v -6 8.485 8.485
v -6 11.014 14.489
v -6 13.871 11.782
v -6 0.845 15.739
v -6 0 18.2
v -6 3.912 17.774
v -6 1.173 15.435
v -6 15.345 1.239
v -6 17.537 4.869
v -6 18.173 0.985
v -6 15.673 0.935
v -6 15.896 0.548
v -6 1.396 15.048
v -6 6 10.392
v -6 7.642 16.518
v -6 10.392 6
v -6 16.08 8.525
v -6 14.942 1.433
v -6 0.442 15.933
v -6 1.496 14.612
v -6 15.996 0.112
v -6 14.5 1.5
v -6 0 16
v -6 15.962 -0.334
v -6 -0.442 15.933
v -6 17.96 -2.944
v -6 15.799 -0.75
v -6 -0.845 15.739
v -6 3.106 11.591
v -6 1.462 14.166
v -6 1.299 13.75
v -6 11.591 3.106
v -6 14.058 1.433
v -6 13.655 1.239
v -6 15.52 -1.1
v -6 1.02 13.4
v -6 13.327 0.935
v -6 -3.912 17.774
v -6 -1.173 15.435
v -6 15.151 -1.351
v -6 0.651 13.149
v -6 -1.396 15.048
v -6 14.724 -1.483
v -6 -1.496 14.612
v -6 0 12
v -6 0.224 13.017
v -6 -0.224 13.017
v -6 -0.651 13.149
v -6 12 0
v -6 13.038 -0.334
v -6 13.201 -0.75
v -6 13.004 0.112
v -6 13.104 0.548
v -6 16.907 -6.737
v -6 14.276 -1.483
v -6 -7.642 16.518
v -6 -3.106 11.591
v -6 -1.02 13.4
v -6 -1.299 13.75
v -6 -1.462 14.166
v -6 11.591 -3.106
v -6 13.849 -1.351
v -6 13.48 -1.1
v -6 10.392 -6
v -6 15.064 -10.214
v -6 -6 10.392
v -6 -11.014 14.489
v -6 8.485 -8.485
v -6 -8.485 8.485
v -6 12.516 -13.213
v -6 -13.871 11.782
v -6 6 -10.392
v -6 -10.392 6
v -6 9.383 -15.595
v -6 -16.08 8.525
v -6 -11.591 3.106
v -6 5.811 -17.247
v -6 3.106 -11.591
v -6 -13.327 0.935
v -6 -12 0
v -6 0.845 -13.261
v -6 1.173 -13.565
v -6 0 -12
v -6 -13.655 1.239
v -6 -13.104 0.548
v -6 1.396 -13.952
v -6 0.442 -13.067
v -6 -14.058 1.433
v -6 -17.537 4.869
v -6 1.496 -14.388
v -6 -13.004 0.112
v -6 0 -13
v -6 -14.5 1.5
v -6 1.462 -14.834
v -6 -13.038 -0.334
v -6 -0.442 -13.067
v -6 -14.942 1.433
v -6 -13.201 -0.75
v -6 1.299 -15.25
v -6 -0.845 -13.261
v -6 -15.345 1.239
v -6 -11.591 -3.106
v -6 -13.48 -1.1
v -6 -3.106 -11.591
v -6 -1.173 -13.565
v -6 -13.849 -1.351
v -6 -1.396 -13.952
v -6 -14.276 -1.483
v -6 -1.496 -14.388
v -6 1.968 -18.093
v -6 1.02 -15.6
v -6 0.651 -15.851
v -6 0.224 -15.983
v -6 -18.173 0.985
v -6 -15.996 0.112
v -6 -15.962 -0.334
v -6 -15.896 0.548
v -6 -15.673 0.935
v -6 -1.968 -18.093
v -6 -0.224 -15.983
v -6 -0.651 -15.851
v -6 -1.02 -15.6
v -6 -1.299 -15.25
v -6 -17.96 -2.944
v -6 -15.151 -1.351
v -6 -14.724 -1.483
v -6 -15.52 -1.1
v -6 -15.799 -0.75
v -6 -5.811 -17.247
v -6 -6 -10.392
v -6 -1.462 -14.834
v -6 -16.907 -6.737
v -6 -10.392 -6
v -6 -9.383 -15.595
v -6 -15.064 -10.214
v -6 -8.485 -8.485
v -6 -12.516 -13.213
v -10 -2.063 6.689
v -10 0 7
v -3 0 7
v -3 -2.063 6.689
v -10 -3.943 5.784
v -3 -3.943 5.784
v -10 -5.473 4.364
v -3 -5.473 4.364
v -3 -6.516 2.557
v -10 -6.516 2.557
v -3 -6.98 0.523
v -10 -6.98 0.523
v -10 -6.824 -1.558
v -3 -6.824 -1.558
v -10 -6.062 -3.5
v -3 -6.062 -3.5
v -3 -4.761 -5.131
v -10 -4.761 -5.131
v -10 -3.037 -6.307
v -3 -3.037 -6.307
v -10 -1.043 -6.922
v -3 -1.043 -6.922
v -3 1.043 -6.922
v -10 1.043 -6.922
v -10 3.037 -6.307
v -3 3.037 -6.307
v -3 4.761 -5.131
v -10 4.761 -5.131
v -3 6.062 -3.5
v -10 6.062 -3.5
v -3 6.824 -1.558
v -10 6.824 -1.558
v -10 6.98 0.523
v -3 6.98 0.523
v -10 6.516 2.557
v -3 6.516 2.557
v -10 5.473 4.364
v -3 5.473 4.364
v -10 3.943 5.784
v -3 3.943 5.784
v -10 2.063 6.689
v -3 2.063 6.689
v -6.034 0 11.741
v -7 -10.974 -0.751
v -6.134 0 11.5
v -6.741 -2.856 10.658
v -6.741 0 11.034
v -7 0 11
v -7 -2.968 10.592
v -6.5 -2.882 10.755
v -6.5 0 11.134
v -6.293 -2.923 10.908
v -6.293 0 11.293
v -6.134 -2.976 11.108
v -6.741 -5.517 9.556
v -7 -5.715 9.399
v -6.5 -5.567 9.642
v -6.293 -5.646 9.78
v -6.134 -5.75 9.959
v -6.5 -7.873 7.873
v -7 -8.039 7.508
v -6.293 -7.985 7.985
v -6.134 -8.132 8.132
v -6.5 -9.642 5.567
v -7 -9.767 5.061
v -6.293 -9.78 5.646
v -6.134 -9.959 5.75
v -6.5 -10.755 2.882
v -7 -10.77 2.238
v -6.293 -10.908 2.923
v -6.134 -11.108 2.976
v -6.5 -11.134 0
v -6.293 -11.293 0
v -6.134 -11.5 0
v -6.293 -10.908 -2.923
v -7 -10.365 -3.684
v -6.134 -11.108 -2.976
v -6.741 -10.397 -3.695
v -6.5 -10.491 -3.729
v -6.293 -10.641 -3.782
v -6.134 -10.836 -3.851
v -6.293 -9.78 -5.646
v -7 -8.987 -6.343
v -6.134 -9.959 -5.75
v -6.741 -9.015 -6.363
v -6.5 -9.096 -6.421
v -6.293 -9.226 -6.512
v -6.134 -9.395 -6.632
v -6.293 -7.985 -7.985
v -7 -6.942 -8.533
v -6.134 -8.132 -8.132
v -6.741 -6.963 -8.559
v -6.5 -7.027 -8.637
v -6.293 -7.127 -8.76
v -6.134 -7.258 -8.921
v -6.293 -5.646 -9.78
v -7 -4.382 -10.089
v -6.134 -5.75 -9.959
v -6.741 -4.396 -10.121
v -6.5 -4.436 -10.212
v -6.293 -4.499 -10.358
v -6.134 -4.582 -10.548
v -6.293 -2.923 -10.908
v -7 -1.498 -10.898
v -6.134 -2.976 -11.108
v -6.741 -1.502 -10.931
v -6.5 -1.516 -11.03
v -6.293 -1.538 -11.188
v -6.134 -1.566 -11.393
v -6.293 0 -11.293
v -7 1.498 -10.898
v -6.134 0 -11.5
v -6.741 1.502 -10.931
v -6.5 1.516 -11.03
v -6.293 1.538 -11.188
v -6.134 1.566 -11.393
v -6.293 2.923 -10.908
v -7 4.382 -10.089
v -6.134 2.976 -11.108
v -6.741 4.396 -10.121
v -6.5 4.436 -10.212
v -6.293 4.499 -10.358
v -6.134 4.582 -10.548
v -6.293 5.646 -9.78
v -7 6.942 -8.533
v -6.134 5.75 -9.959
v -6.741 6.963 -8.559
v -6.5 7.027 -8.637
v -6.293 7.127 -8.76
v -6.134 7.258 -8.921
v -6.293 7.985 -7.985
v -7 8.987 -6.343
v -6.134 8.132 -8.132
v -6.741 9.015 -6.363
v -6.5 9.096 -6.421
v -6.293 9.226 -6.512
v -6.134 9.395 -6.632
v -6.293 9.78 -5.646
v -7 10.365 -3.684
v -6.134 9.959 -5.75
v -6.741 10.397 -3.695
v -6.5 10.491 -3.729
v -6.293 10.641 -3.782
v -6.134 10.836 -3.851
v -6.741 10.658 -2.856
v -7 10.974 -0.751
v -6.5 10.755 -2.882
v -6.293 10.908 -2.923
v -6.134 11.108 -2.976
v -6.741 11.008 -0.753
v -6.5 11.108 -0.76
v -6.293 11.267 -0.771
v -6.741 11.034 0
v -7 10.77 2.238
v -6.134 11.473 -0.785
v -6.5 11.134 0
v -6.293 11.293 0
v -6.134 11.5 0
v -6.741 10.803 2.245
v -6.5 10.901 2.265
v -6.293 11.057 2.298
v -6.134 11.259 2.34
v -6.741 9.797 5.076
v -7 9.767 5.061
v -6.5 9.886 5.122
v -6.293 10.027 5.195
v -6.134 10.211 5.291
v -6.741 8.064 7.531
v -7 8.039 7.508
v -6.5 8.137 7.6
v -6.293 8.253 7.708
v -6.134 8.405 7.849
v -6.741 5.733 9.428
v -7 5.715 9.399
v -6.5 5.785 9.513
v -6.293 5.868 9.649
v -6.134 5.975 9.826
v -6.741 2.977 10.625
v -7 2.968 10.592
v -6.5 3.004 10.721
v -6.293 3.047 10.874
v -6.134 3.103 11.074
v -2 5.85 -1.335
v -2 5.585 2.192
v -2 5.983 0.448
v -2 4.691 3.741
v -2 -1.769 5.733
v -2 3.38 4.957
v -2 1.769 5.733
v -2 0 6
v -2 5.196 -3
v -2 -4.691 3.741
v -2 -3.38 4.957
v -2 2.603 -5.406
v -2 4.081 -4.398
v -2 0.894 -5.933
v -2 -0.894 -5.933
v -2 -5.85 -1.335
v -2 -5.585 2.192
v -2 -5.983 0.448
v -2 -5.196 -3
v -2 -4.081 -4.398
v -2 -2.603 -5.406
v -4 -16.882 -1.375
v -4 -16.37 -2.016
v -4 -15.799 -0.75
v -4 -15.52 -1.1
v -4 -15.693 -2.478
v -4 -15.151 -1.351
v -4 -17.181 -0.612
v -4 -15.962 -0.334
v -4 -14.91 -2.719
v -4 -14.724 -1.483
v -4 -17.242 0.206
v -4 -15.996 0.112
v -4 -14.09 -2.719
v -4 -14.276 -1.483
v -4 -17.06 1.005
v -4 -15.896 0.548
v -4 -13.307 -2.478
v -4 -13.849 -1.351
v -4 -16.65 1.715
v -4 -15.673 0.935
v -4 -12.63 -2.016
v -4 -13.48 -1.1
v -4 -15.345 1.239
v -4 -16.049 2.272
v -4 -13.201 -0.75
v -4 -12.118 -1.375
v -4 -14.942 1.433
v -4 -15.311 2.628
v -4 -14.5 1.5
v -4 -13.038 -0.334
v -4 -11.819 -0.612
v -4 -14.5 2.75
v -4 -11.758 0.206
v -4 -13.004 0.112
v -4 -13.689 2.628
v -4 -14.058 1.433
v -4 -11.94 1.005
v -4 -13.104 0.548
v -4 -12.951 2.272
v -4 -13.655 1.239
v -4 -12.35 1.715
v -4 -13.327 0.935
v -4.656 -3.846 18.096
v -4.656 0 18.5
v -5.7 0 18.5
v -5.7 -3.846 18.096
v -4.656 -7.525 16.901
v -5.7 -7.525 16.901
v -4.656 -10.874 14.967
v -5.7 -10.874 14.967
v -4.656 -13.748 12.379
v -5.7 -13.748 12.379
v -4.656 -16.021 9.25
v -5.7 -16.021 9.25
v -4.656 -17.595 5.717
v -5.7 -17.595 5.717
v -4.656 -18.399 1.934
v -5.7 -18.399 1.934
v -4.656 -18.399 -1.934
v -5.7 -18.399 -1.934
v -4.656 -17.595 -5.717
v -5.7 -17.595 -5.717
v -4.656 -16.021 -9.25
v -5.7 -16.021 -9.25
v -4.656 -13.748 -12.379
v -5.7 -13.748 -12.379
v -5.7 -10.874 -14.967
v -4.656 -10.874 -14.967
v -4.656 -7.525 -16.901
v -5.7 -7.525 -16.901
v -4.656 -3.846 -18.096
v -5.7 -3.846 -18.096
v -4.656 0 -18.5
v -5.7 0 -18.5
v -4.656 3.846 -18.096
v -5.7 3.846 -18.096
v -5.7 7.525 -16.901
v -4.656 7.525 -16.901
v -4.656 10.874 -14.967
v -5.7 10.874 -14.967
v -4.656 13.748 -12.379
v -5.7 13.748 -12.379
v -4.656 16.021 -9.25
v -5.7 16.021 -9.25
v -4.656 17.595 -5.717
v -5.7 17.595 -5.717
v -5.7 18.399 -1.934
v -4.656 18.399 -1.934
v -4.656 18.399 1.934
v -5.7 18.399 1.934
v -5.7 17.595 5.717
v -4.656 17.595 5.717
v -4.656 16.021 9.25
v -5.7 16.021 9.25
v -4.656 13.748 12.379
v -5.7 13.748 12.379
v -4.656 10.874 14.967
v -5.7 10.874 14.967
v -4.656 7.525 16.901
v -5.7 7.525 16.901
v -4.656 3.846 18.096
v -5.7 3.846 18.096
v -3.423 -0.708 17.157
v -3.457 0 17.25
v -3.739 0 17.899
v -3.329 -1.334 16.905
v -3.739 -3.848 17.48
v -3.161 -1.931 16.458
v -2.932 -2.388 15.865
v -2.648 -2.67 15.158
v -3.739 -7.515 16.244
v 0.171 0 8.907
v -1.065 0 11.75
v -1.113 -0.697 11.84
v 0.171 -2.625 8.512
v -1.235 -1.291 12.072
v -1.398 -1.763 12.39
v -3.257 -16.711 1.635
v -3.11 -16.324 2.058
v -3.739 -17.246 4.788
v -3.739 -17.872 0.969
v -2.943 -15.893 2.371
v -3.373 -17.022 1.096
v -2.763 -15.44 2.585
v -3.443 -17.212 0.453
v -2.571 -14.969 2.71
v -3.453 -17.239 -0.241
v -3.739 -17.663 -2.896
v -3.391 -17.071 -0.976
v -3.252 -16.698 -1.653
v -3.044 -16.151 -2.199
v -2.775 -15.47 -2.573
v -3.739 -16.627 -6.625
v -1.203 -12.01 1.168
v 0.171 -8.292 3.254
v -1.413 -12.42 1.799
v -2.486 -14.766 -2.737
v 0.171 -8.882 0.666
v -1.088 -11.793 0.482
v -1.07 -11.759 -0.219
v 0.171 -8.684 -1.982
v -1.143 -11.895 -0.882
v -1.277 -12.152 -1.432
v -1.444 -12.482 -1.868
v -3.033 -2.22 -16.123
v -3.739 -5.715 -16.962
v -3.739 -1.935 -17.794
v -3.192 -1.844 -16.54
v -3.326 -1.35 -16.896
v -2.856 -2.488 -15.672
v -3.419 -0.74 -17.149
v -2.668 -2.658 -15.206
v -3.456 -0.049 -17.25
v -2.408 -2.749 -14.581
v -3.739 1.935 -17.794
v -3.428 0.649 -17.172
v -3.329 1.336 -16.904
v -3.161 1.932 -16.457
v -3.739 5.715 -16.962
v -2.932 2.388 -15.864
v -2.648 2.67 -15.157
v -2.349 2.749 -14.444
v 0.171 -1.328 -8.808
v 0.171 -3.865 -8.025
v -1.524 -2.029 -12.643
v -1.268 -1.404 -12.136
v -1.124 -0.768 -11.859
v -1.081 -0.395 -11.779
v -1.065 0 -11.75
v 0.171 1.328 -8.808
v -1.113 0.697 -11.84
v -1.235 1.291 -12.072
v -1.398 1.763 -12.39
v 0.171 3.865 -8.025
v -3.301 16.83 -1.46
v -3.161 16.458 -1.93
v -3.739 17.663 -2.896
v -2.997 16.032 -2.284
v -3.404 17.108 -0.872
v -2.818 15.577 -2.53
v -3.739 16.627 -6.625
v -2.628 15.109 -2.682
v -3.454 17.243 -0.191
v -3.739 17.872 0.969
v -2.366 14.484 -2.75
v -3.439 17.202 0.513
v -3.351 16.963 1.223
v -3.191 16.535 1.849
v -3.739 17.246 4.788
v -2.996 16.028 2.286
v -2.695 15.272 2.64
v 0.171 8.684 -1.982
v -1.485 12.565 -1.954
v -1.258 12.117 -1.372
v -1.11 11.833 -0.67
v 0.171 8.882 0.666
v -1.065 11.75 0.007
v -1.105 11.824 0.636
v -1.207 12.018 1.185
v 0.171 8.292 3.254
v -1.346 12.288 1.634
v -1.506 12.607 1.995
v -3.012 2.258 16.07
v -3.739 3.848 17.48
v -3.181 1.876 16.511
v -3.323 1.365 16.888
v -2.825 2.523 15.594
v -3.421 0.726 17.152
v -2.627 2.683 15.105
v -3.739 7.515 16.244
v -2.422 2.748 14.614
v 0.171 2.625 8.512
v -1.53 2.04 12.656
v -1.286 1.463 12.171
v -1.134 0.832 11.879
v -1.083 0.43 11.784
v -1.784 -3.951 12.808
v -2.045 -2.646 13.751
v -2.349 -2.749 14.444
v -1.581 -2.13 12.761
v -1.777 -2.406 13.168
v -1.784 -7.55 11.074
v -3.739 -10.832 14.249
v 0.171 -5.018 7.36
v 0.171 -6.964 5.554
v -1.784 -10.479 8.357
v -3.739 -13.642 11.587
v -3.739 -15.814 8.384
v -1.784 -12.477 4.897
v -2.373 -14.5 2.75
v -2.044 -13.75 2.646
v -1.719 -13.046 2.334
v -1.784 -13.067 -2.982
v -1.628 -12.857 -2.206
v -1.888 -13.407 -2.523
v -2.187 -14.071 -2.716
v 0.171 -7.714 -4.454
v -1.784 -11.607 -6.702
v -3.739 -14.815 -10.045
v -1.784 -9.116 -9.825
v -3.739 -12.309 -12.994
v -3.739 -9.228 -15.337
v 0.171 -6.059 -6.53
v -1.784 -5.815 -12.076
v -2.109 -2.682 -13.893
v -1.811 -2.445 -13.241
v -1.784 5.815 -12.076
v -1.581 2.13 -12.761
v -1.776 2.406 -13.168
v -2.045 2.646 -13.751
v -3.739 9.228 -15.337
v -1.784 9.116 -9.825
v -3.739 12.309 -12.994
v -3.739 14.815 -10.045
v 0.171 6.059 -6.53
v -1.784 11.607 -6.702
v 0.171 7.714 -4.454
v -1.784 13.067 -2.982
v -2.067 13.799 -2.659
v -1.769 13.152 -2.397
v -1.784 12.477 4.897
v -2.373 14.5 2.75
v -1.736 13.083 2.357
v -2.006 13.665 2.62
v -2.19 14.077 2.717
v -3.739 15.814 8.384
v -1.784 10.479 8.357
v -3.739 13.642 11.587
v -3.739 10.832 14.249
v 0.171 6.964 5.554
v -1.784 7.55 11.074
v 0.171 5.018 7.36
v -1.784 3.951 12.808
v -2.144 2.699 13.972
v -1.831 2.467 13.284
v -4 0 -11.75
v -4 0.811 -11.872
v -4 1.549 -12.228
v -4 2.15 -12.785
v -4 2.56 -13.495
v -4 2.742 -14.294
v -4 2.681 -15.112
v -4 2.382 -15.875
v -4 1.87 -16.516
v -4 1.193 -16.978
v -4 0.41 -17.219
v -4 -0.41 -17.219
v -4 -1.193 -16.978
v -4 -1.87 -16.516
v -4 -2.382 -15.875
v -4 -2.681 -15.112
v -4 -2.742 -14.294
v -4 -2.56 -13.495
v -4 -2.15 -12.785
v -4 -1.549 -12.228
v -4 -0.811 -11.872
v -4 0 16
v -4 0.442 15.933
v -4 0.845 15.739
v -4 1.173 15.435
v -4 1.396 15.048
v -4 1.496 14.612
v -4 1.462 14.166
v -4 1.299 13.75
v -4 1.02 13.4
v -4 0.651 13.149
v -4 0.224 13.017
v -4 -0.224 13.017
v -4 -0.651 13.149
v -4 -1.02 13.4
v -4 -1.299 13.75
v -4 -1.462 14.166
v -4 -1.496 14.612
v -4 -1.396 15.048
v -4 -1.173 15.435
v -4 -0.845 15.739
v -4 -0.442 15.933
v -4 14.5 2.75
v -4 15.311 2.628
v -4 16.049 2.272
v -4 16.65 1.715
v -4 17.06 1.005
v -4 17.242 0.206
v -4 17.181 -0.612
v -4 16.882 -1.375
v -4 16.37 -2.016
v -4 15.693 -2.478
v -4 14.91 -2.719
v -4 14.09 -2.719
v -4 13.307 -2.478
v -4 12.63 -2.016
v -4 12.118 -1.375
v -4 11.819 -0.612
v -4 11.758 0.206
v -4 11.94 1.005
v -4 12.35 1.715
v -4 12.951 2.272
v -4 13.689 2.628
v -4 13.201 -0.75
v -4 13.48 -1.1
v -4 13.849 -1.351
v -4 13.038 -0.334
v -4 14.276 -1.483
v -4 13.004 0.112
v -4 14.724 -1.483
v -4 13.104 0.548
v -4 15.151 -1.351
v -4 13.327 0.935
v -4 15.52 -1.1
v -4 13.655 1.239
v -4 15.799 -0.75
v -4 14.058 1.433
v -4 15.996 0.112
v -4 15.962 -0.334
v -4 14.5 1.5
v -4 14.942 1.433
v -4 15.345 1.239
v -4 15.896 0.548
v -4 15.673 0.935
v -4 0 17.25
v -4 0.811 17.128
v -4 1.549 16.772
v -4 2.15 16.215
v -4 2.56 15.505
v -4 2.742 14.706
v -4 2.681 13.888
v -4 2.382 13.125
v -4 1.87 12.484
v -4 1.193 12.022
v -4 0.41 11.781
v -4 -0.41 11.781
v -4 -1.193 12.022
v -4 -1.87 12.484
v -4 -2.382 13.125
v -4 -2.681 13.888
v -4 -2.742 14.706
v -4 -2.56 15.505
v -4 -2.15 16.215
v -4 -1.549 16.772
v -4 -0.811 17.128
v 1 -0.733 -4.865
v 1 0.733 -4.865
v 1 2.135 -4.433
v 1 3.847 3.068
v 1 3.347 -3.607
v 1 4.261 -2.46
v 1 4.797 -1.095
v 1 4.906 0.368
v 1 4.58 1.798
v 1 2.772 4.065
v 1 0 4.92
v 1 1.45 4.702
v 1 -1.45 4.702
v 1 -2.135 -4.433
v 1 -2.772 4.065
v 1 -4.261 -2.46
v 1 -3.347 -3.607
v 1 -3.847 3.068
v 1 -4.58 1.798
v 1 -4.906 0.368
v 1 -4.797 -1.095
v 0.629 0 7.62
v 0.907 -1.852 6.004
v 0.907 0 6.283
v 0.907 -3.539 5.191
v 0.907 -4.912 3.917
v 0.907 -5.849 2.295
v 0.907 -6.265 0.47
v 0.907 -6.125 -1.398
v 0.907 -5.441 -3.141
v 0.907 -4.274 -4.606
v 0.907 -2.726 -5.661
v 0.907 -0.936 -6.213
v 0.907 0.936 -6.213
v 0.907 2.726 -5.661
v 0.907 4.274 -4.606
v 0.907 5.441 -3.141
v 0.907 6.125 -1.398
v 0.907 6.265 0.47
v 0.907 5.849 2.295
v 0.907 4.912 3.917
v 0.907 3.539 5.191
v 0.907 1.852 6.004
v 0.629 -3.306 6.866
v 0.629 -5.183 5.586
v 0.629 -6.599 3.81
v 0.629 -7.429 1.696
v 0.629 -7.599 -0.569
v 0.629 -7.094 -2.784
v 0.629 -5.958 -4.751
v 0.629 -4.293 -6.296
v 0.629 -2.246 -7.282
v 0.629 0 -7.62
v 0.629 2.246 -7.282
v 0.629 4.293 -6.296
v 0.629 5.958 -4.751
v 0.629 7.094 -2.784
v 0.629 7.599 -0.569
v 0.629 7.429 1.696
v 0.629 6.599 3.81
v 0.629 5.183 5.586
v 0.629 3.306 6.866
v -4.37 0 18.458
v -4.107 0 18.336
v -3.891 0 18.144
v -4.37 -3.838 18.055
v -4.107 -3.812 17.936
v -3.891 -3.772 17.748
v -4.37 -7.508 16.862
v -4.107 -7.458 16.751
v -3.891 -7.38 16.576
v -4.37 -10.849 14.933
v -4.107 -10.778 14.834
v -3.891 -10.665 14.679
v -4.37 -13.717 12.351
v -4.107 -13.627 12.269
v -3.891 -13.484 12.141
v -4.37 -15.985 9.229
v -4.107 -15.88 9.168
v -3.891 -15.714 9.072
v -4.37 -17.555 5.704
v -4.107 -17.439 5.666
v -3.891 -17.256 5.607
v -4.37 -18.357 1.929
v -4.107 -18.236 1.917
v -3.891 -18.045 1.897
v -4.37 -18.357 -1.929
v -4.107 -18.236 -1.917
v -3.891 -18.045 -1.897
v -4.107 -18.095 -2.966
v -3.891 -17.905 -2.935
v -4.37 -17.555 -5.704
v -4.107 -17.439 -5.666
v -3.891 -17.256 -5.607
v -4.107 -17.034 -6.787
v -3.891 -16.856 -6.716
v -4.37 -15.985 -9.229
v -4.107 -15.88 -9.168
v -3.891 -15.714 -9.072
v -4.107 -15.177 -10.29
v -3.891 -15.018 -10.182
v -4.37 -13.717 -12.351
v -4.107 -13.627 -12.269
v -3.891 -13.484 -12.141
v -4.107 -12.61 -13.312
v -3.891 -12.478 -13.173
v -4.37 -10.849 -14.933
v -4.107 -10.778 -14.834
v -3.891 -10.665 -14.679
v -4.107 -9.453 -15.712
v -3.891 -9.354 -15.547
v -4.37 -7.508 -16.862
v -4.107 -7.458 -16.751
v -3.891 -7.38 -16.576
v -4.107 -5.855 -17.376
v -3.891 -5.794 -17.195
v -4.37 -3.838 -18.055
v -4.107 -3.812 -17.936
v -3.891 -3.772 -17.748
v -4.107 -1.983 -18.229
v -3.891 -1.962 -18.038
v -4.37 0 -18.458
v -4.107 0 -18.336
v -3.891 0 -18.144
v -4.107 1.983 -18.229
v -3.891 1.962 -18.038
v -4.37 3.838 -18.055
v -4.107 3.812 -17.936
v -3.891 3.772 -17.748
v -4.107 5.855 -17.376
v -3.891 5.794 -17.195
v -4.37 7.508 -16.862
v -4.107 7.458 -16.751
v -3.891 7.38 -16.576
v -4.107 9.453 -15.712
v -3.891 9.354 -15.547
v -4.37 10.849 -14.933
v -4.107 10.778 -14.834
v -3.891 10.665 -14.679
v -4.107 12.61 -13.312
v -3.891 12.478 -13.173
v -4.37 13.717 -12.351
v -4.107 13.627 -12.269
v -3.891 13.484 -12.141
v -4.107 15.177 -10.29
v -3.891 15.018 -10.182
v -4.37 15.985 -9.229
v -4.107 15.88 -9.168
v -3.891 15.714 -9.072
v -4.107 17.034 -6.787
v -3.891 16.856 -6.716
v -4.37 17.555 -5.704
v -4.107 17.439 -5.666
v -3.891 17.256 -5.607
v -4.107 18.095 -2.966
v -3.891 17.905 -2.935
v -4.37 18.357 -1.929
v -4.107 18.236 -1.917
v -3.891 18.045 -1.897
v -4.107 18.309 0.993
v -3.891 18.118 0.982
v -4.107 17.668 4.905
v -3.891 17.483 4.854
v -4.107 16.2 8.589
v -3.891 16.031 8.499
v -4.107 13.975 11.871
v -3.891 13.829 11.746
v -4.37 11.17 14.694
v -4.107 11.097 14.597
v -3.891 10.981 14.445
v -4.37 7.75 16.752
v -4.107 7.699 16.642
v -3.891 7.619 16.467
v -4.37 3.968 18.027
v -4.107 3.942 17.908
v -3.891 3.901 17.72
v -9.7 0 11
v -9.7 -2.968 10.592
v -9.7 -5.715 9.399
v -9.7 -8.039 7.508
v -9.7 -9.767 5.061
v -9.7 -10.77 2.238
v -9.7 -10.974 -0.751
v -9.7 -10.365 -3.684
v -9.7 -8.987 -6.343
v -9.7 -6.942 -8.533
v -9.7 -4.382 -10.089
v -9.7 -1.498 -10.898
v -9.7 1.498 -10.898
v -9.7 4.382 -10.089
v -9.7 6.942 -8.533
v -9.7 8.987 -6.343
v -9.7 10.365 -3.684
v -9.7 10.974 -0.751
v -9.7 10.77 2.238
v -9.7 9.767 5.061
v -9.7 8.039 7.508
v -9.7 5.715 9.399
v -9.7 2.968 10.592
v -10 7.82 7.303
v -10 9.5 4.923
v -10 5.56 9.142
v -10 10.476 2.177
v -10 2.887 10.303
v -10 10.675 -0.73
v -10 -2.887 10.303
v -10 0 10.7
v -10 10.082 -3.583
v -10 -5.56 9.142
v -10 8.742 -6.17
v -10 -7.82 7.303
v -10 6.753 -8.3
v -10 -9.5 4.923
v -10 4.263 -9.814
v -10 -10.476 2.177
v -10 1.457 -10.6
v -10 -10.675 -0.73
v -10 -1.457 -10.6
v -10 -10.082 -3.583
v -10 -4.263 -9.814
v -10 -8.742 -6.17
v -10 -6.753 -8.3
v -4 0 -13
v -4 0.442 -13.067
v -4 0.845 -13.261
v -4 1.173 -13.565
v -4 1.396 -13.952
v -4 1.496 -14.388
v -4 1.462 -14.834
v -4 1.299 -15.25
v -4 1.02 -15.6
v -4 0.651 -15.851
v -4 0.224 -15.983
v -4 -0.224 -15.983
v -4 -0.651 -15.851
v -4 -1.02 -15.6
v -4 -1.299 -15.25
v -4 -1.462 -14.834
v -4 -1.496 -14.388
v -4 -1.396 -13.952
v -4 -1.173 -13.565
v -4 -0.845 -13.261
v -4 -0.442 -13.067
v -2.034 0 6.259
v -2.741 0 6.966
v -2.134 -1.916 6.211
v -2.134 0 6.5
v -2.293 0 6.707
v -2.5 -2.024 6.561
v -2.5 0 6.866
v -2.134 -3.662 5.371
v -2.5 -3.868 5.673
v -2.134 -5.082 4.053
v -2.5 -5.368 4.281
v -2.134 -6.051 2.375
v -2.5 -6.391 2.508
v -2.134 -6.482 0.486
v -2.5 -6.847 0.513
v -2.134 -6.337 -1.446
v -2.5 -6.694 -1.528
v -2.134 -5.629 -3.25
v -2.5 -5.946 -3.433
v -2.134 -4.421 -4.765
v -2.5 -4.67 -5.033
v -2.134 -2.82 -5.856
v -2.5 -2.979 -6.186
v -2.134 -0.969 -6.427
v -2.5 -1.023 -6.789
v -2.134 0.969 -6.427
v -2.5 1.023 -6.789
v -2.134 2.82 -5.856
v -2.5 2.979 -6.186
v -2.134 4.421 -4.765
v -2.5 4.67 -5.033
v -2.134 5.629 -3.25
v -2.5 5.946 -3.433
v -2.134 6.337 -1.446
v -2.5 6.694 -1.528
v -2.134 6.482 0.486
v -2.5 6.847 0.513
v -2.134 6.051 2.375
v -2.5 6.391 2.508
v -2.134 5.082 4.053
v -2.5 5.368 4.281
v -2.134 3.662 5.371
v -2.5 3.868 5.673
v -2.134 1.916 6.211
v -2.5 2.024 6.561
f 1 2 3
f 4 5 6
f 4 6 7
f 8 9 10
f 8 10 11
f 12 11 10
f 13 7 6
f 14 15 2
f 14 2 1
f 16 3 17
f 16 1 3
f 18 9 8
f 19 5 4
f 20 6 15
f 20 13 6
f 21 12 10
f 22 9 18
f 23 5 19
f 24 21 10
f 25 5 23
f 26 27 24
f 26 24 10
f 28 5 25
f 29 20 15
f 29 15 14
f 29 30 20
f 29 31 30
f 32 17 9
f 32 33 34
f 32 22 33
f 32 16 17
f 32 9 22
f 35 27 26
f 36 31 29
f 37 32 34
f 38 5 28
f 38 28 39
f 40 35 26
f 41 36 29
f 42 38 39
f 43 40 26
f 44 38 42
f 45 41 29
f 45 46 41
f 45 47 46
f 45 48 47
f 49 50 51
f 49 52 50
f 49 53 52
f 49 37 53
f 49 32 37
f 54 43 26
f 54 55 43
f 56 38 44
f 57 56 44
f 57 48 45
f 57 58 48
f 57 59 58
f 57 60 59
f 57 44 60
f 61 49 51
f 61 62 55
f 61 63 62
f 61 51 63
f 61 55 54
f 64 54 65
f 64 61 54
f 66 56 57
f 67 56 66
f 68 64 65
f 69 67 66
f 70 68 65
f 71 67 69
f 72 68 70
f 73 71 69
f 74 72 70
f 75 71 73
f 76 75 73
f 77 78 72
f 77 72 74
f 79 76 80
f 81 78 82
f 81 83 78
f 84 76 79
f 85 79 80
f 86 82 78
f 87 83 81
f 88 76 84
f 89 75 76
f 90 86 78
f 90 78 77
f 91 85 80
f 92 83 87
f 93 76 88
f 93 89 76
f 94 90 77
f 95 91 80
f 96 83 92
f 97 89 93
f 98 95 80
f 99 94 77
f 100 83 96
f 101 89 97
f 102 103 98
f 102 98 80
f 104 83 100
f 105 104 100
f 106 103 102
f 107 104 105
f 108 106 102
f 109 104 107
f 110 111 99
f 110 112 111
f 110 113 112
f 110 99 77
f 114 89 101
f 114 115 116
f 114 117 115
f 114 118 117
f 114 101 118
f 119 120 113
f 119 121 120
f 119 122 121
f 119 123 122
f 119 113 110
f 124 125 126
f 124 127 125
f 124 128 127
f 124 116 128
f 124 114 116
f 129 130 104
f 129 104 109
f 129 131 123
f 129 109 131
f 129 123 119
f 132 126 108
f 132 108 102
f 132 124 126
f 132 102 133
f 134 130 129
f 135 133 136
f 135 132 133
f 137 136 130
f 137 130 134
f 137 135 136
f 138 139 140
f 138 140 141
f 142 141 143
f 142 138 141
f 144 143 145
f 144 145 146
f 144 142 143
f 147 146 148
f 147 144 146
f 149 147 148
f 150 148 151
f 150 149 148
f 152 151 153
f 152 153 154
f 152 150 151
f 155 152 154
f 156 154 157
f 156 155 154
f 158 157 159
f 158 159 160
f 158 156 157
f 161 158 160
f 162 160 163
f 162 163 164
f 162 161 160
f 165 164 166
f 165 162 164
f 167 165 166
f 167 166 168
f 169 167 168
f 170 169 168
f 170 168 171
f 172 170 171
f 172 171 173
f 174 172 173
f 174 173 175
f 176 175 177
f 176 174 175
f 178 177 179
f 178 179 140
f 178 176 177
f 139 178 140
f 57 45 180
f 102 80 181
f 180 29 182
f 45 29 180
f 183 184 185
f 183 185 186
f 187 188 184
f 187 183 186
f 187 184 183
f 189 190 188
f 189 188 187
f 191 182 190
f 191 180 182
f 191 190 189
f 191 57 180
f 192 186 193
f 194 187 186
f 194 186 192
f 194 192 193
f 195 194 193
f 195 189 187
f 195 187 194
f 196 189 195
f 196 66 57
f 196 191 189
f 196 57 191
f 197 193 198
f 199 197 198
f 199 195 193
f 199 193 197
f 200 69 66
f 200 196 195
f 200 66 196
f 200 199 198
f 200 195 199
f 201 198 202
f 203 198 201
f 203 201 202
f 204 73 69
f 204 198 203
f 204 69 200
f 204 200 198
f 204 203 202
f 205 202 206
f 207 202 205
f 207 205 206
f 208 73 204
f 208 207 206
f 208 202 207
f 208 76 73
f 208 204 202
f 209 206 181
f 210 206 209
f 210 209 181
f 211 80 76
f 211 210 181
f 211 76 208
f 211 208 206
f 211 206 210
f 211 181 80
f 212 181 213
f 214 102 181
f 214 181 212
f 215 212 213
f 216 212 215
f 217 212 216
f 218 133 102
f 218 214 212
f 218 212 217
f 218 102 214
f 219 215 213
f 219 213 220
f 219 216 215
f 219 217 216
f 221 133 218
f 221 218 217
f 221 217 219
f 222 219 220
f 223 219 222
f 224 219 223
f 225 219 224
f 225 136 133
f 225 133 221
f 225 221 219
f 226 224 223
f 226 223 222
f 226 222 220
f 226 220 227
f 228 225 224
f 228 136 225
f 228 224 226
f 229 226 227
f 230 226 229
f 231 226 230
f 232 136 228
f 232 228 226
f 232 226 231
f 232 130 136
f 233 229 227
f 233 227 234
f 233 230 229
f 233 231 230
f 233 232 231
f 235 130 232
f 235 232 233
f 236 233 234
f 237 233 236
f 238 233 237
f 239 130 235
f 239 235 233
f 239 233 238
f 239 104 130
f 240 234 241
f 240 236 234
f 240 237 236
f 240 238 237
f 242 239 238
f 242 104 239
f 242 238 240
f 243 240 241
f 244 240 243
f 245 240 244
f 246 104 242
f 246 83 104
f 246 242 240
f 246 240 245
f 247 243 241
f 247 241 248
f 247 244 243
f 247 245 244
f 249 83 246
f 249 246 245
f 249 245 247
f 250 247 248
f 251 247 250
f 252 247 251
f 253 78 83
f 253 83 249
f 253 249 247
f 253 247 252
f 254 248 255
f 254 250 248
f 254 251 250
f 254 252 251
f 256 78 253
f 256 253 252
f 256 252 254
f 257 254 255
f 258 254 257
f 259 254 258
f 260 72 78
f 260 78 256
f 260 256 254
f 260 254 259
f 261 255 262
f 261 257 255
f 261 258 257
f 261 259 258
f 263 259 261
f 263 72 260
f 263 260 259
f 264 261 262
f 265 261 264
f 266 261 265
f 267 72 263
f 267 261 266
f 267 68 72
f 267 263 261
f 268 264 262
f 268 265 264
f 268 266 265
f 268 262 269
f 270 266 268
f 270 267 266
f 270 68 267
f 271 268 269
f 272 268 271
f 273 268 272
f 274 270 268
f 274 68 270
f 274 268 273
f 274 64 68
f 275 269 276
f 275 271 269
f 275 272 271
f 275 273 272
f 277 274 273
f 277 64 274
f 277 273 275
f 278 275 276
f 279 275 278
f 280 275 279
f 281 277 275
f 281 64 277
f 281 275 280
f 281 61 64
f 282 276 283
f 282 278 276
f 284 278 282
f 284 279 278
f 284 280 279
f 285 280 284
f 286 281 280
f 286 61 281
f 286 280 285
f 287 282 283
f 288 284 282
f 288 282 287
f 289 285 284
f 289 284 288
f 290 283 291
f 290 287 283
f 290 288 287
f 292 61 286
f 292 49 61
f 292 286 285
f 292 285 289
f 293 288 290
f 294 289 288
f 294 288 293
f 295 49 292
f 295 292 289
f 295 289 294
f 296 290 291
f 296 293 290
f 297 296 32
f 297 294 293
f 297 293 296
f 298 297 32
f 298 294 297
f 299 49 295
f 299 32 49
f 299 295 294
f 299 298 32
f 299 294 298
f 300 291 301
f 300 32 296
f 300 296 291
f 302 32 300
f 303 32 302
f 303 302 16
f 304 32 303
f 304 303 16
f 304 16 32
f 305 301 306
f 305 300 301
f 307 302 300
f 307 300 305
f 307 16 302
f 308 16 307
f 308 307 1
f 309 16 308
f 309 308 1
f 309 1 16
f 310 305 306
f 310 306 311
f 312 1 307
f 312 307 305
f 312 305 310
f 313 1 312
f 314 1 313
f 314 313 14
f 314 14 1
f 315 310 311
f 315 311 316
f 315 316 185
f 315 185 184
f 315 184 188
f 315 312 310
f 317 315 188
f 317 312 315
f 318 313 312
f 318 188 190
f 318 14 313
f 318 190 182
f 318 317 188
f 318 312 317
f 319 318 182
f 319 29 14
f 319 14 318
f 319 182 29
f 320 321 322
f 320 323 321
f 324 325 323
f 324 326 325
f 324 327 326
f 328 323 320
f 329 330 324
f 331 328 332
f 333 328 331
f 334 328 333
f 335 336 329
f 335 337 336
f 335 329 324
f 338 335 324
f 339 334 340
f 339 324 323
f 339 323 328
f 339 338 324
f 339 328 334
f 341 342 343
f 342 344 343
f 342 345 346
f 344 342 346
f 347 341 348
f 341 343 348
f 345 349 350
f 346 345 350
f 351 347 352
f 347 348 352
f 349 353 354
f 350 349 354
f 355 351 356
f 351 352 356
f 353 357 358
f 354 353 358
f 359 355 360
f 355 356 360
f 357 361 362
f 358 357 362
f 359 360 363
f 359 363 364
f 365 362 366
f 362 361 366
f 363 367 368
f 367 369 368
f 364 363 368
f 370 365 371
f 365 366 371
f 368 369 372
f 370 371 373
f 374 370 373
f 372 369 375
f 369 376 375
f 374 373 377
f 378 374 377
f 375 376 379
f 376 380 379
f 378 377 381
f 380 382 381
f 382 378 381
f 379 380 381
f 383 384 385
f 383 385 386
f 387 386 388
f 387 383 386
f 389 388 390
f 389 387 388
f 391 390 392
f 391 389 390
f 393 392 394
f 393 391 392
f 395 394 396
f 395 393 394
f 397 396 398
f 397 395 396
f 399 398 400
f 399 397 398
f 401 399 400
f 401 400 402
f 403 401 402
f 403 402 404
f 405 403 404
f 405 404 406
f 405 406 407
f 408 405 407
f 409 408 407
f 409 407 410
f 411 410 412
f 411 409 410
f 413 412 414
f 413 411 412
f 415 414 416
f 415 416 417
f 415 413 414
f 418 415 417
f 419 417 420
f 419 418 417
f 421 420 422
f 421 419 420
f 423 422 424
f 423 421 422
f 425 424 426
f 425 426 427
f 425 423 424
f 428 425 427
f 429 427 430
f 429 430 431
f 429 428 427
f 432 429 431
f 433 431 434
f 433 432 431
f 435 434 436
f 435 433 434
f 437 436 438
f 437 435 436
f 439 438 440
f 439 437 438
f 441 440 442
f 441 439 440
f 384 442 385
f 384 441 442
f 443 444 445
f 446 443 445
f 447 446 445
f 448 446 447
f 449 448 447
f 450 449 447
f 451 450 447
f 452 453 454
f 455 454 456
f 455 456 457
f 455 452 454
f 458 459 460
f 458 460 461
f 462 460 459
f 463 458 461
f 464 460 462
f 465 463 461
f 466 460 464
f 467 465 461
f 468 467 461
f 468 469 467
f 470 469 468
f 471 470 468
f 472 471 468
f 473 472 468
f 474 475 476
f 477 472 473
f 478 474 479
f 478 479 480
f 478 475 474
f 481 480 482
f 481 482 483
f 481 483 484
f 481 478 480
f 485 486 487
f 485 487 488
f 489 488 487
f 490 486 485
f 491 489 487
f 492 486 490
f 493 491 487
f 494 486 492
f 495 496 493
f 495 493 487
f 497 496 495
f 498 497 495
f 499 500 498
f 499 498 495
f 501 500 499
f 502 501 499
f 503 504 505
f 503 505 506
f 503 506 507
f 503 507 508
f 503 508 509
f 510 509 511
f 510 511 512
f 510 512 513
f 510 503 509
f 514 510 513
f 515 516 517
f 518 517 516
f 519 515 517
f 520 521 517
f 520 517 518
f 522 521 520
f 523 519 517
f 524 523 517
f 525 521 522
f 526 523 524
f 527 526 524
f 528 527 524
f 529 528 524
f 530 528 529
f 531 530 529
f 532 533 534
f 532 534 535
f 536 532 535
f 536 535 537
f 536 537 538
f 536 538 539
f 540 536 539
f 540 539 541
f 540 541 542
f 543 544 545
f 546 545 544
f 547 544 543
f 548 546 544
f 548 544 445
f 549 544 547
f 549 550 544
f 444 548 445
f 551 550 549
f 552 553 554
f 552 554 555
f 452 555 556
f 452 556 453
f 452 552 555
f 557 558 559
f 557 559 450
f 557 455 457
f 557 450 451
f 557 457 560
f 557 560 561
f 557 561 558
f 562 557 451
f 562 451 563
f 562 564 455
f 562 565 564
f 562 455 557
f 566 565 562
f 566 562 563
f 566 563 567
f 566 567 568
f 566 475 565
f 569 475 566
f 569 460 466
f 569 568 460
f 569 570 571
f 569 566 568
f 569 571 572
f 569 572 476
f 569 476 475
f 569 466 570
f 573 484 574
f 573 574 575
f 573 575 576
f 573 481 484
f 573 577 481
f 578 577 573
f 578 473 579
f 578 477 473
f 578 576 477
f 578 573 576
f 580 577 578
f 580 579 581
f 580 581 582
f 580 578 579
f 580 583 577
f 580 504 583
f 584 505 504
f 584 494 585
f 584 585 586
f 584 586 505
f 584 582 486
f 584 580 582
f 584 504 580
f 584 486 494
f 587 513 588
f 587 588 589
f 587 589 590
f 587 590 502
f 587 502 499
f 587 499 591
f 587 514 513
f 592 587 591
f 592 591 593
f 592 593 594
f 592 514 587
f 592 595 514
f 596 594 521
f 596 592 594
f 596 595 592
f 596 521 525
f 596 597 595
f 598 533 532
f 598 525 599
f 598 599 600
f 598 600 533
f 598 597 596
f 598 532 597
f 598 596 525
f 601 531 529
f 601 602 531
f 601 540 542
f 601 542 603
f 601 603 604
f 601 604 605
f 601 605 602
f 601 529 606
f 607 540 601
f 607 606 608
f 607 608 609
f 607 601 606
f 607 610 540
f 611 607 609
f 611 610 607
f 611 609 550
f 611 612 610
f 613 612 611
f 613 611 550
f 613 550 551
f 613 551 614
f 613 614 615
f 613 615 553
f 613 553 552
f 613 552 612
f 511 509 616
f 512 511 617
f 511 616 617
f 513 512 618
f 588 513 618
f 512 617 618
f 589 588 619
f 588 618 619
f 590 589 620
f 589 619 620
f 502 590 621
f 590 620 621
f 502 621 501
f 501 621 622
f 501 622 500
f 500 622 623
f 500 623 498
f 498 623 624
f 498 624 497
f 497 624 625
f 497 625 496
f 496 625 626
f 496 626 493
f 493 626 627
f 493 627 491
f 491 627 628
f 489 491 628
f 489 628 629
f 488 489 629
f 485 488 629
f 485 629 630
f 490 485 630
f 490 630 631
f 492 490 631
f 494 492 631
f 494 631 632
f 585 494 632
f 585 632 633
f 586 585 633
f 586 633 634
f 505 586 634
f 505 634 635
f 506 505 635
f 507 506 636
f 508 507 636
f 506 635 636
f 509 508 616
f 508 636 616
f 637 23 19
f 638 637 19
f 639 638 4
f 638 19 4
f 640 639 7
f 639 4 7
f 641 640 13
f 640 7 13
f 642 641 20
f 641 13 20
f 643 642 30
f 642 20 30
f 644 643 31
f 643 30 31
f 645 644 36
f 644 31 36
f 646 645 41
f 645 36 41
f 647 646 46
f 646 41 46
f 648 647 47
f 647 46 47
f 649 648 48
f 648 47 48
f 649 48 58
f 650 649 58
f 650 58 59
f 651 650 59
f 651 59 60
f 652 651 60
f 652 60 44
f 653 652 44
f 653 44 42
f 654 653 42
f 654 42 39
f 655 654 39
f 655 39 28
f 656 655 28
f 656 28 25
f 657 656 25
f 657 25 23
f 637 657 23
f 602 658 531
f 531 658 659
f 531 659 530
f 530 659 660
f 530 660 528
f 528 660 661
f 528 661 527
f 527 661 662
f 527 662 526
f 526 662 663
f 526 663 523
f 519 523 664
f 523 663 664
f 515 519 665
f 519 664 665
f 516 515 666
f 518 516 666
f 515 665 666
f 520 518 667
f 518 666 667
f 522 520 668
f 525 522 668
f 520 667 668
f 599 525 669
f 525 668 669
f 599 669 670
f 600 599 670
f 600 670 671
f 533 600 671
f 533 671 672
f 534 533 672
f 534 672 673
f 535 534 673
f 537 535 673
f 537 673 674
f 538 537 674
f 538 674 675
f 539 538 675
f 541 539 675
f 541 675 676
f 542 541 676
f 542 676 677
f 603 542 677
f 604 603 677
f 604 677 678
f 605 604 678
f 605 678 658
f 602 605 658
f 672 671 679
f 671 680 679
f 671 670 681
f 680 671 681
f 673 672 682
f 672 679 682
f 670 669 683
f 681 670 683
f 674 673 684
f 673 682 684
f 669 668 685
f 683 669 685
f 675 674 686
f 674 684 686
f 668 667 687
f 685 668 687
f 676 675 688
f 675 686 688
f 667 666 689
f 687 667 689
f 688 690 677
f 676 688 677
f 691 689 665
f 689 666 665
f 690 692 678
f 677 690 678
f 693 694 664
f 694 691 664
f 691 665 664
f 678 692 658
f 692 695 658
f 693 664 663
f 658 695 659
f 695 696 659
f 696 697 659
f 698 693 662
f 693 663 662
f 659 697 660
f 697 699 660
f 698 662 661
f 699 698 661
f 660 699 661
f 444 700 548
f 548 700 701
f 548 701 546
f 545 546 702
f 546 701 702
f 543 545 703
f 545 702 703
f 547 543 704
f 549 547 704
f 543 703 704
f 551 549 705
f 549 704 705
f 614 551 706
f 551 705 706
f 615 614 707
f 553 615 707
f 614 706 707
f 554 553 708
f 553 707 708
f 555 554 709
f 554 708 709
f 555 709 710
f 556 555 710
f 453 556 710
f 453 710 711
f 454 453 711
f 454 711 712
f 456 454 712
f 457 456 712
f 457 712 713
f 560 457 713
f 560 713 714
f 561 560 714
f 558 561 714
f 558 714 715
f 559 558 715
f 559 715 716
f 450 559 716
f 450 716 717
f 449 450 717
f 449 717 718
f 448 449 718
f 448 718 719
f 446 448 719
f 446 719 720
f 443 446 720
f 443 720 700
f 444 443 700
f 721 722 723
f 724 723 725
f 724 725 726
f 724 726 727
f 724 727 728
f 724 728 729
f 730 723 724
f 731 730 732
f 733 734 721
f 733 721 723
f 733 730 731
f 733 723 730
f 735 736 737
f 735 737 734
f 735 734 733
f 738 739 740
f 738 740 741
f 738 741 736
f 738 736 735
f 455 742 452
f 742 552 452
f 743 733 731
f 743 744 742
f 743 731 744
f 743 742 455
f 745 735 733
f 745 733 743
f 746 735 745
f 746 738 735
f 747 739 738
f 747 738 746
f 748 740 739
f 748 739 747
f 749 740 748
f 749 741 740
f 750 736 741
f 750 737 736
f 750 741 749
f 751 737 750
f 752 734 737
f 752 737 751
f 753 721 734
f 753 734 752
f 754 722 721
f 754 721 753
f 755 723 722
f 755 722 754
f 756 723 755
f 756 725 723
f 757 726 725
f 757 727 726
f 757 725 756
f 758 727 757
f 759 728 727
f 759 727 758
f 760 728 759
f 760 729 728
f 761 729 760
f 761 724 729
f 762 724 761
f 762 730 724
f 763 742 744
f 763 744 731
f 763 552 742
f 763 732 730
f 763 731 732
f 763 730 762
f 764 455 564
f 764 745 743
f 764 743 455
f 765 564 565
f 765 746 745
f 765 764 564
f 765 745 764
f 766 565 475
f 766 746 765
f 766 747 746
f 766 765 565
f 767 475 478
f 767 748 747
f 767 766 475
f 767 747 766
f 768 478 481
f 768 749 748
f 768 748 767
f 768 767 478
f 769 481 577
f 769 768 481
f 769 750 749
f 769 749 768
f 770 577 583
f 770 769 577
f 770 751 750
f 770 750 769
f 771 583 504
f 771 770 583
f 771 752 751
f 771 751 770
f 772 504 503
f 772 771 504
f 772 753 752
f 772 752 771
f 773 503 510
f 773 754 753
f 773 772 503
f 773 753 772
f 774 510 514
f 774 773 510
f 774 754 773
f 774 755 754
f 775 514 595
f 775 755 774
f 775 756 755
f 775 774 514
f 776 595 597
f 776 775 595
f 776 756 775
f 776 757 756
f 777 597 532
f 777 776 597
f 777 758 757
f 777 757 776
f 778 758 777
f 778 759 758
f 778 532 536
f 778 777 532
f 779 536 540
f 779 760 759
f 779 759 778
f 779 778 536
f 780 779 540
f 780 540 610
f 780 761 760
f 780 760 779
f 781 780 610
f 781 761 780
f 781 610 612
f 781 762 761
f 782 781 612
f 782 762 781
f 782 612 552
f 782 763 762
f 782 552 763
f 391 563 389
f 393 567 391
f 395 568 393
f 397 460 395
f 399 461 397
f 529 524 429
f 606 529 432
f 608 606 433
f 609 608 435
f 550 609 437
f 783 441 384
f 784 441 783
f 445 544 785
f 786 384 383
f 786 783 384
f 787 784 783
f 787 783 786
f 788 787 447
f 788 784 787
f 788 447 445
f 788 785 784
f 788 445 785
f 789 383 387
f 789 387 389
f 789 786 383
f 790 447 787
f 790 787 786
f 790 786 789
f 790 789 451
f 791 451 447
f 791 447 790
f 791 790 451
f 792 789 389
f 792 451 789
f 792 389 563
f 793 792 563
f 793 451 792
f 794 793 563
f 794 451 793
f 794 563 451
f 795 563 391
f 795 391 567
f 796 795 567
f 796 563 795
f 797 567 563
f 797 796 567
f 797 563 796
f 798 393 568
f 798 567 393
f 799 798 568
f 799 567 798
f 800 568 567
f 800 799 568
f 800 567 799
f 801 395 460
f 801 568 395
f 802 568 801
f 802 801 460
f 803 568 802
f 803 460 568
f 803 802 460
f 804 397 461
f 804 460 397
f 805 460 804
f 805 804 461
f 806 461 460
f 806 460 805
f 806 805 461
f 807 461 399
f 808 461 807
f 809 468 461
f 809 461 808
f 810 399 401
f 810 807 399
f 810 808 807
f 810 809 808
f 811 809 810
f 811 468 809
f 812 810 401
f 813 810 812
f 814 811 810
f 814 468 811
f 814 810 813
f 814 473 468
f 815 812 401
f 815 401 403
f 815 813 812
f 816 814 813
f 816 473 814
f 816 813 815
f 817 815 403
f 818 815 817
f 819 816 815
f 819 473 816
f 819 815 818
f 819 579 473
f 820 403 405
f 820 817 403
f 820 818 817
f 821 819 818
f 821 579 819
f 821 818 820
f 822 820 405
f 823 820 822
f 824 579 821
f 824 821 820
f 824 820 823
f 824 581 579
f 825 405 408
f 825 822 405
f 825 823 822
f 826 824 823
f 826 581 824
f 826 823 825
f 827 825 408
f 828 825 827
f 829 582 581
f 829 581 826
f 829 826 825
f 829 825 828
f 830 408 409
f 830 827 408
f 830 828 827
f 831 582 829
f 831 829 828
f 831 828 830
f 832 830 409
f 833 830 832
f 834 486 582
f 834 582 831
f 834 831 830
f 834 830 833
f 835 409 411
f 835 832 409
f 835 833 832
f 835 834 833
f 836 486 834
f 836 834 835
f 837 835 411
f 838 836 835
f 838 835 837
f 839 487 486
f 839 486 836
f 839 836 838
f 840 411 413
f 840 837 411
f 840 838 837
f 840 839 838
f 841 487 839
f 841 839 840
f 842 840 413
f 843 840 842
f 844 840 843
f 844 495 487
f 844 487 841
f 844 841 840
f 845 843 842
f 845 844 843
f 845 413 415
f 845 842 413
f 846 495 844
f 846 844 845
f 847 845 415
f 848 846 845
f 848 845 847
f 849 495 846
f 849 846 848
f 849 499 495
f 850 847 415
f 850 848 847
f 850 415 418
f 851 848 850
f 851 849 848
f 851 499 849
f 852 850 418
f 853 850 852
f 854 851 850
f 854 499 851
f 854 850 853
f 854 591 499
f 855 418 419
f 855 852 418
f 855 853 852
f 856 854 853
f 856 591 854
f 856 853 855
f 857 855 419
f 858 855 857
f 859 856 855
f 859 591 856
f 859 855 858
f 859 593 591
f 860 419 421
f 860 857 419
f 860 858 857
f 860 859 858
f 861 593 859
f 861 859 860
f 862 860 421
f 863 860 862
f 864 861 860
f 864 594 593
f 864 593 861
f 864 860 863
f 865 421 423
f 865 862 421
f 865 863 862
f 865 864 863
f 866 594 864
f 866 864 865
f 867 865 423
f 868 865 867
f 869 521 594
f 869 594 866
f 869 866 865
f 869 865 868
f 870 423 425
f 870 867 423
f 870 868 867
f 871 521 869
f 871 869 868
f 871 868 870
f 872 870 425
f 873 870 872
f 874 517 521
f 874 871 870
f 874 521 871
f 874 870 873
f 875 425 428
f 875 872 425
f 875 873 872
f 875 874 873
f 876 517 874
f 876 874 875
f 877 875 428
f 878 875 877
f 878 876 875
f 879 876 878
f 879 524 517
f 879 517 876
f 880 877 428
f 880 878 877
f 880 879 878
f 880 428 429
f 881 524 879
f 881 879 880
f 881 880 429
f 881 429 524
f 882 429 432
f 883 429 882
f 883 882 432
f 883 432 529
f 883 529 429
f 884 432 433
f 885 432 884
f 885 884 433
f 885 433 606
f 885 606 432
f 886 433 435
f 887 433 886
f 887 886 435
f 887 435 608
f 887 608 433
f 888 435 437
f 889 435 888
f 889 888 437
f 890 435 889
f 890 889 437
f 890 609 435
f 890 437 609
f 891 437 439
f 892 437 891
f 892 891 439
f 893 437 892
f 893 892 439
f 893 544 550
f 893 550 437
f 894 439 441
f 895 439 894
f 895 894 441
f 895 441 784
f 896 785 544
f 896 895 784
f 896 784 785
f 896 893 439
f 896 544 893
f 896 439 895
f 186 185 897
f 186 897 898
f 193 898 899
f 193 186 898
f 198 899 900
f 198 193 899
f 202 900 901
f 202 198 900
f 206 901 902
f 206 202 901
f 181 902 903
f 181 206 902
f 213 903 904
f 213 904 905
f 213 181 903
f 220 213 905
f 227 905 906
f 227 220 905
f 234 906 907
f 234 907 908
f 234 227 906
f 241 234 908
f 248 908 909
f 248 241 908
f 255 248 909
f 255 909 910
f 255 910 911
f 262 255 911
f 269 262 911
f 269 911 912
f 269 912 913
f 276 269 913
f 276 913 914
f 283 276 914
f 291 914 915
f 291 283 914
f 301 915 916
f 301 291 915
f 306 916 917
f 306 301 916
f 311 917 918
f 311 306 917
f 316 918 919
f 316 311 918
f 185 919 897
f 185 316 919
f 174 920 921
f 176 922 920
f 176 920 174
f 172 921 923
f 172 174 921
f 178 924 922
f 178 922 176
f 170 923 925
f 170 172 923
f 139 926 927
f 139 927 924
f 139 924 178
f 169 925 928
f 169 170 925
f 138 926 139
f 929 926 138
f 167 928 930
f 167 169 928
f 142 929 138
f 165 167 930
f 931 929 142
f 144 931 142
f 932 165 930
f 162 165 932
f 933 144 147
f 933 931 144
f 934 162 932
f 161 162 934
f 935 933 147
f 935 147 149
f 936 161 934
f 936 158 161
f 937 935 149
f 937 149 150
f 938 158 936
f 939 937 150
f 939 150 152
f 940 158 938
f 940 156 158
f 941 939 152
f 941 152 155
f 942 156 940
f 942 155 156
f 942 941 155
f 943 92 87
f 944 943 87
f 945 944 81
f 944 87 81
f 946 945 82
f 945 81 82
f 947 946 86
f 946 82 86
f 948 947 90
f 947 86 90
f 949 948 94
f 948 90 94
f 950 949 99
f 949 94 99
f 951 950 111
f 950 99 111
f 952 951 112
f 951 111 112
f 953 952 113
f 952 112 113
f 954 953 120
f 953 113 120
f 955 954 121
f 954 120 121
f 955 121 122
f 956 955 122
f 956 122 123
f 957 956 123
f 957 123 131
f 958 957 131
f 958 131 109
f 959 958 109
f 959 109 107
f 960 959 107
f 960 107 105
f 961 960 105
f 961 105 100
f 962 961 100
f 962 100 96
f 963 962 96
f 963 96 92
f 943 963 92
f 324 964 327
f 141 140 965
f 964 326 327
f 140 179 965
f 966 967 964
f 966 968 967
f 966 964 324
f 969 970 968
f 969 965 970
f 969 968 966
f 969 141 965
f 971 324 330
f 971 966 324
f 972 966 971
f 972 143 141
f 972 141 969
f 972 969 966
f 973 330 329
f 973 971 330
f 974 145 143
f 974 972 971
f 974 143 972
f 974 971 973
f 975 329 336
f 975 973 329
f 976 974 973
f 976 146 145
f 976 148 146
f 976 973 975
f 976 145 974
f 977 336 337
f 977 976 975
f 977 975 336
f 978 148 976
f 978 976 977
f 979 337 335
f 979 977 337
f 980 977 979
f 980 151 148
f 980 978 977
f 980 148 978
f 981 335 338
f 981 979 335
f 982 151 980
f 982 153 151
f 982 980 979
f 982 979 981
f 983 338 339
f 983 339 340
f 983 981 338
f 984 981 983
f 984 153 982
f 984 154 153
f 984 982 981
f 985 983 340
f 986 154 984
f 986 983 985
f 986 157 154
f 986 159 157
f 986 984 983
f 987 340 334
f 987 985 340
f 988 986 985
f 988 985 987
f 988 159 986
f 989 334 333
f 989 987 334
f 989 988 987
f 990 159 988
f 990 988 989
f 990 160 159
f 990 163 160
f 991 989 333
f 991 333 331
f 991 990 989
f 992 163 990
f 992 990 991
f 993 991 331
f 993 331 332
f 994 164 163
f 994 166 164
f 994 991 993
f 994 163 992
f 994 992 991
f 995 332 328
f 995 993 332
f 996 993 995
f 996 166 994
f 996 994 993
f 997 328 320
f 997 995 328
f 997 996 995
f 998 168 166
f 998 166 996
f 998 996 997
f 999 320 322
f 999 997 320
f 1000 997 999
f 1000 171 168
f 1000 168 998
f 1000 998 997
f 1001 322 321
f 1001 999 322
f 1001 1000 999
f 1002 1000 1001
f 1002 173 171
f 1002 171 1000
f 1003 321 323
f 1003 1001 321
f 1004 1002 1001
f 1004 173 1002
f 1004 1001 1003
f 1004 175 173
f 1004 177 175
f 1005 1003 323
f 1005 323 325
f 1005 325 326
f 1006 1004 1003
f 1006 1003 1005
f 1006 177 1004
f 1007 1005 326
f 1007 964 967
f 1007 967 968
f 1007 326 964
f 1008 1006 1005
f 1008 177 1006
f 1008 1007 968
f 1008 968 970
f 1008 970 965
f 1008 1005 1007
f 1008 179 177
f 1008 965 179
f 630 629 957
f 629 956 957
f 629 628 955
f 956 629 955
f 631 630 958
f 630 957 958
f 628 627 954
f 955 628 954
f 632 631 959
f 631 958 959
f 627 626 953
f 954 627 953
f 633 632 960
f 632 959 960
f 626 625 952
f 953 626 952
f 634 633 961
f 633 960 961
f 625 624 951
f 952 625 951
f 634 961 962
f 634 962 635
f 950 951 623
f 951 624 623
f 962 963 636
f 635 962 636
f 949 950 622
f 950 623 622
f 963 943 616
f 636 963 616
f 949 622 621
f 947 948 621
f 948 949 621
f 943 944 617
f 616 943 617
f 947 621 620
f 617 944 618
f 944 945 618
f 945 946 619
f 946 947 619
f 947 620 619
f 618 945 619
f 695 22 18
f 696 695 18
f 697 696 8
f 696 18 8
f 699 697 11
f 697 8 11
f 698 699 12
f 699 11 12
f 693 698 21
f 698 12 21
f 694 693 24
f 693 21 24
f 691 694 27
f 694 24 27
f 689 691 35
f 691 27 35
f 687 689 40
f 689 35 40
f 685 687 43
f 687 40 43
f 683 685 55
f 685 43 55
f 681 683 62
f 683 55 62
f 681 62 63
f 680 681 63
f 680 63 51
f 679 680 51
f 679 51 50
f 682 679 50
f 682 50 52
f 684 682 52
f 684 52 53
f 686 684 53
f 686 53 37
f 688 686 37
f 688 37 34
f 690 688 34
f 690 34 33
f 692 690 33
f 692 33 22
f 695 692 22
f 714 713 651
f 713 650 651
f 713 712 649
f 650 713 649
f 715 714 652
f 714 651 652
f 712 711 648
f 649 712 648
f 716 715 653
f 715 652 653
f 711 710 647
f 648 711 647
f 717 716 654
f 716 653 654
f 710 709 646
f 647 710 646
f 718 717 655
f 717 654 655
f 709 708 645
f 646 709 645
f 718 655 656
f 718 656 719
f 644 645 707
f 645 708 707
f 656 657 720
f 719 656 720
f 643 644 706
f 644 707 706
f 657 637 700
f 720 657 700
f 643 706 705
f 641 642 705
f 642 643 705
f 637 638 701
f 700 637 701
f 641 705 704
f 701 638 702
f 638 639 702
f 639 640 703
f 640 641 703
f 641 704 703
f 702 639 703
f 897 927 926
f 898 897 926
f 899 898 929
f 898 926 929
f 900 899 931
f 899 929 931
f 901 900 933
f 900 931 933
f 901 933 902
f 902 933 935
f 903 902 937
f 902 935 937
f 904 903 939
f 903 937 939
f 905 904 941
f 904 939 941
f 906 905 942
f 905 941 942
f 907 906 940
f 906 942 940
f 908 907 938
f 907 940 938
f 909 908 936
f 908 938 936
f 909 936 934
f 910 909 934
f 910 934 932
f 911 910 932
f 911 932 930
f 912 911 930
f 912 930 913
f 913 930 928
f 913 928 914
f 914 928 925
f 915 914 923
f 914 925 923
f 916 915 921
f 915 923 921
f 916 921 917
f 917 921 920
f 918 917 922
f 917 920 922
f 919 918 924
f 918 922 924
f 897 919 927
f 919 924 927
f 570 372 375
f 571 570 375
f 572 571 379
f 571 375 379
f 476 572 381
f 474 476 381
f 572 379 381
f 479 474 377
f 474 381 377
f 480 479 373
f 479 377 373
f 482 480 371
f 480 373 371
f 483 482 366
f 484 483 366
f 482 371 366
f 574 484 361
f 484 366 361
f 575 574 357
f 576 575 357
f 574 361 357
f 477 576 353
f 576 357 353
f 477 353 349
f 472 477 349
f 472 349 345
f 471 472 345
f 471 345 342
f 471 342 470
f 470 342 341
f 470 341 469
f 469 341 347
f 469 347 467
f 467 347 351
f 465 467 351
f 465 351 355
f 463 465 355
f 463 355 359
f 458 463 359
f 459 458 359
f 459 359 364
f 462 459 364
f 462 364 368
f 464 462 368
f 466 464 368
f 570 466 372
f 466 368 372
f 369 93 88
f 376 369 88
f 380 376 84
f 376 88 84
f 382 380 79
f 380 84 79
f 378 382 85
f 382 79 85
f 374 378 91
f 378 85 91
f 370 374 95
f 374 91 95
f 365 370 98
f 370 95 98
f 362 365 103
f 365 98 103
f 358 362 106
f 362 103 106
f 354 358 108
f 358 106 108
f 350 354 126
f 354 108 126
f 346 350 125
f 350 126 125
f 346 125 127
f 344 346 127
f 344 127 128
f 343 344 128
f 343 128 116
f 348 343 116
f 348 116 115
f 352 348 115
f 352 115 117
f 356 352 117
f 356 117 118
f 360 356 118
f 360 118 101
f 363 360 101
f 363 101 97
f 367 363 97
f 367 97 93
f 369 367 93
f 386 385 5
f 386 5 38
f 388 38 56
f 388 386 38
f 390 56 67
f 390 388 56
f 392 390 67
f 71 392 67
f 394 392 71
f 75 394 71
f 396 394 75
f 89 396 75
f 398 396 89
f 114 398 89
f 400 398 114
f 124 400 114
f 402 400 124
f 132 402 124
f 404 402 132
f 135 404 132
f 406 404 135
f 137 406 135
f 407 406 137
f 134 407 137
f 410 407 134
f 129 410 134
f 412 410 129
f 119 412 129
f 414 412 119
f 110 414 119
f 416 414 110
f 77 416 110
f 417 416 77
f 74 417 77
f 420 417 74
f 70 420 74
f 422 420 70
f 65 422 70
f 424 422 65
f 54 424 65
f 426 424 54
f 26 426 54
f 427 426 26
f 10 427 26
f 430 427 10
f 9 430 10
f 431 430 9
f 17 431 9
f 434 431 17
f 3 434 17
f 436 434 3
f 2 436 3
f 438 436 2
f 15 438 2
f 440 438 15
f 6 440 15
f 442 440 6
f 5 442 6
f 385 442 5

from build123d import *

# Parameters (mm, degrees)
FILLET2_R          = 1
CHAMFER1_SIZE      = 0.3
SKETCH2_R          = 1.5
CUT_EXTRUDE1_DEPTH = 10
SKETCH3_R          = 2.75
CUT_EXTRUDE2_DEPTH = 10


with BuildPart() as part:
    # Sketch1 → Revolve1 (revolve)
    with BuildSketch(Plane.XY, mode=Mode.PRIVATE) as revolve1_sk:
        with BuildLine():
            Line((-10, 7), (-10, 11))
            Line((-10, 11), (-6, 11))
            Line((-6, 11), (-6, 18.5))
            Line((-6, 18.5), (-4.655646626, 18.5))
            ThreePointArc((-4.655646626, 18.5), (-4.107342929, 18.336279293), (-3.73857657, 17.898726111))
            Line((-3.73857657, 17.898726111), (0.170700563, 8.907388706))
            ThreePointArc((0.170700563, 8.907388706), (0.790480214, 6.956422558), (1, 4.920127592))
            Line((1, 4.920127592), (1, 0))
            Line((1, 0), (-2, 0))
            Line((-2, 0), (-2, 7))
            Line((-2, 7), (-10, 7))
        make_face()
    revolve(revolve1_sk.sketch.rotate(Axis((0, 0, 0), (1, 0, 0)), 90), axis=Axis((0, 0, 0), (1, 0, 0)))

    # Fillet2
    fillet2_edges = [part.edges().sort_by_distance(p)[0] for p in [
        (-6, 0, -11),
        (-2, 0, -7),
    ]]
    fillet(fillet2_edges, radius=FILLET2_R)

    # Chamfer1
    chamfer1_edges = [part.edges().sort_by_distance(p)[0] for p in [
        (-6, 0, -18.5),
        (-10, 0, -11),
    ]]
    chamfer(chamfer1_edges, length=CHAMFER1_SIZE)

    # Sketch2 → Cut-Extrude1 (cut)
    with BuildSketch(Plane.ZY.offset(6)):
        with Locations((0, 14.5)):
            Circle(SKETCH2_R)
        with Locations((14.5, 0)):
            Circle(SKETCH2_R)
        with Locations((0, -14.5)):
            Circle(SKETCH2_R)
        with Locations((-14.5, 0)):
            Circle(SKETCH2_R)
    extrude(amount=-CUT_EXTRUDE1_DEPTH, mode=Mode.SUBTRACT)

    # Sketch3 → Cut-Extrude2 (cut)
    with BuildSketch(Plane.ZY.offset(4)):
        with Locations((0, 14.5)):
            Circle(SKETCH3_R)
        with Locations((14.5, 0)):
            Circle(SKETCH3_R)
        with Locations((0, -14.5)):
            Circle(SKETCH3_R)
        with Locations((-14.5, 0)):
            Circle(SKETCH3_R)
    extrude(amount=-CUT_EXTRUDE2_DEPTH, mode=Mode.SUBTRACT)


solid = part.part
